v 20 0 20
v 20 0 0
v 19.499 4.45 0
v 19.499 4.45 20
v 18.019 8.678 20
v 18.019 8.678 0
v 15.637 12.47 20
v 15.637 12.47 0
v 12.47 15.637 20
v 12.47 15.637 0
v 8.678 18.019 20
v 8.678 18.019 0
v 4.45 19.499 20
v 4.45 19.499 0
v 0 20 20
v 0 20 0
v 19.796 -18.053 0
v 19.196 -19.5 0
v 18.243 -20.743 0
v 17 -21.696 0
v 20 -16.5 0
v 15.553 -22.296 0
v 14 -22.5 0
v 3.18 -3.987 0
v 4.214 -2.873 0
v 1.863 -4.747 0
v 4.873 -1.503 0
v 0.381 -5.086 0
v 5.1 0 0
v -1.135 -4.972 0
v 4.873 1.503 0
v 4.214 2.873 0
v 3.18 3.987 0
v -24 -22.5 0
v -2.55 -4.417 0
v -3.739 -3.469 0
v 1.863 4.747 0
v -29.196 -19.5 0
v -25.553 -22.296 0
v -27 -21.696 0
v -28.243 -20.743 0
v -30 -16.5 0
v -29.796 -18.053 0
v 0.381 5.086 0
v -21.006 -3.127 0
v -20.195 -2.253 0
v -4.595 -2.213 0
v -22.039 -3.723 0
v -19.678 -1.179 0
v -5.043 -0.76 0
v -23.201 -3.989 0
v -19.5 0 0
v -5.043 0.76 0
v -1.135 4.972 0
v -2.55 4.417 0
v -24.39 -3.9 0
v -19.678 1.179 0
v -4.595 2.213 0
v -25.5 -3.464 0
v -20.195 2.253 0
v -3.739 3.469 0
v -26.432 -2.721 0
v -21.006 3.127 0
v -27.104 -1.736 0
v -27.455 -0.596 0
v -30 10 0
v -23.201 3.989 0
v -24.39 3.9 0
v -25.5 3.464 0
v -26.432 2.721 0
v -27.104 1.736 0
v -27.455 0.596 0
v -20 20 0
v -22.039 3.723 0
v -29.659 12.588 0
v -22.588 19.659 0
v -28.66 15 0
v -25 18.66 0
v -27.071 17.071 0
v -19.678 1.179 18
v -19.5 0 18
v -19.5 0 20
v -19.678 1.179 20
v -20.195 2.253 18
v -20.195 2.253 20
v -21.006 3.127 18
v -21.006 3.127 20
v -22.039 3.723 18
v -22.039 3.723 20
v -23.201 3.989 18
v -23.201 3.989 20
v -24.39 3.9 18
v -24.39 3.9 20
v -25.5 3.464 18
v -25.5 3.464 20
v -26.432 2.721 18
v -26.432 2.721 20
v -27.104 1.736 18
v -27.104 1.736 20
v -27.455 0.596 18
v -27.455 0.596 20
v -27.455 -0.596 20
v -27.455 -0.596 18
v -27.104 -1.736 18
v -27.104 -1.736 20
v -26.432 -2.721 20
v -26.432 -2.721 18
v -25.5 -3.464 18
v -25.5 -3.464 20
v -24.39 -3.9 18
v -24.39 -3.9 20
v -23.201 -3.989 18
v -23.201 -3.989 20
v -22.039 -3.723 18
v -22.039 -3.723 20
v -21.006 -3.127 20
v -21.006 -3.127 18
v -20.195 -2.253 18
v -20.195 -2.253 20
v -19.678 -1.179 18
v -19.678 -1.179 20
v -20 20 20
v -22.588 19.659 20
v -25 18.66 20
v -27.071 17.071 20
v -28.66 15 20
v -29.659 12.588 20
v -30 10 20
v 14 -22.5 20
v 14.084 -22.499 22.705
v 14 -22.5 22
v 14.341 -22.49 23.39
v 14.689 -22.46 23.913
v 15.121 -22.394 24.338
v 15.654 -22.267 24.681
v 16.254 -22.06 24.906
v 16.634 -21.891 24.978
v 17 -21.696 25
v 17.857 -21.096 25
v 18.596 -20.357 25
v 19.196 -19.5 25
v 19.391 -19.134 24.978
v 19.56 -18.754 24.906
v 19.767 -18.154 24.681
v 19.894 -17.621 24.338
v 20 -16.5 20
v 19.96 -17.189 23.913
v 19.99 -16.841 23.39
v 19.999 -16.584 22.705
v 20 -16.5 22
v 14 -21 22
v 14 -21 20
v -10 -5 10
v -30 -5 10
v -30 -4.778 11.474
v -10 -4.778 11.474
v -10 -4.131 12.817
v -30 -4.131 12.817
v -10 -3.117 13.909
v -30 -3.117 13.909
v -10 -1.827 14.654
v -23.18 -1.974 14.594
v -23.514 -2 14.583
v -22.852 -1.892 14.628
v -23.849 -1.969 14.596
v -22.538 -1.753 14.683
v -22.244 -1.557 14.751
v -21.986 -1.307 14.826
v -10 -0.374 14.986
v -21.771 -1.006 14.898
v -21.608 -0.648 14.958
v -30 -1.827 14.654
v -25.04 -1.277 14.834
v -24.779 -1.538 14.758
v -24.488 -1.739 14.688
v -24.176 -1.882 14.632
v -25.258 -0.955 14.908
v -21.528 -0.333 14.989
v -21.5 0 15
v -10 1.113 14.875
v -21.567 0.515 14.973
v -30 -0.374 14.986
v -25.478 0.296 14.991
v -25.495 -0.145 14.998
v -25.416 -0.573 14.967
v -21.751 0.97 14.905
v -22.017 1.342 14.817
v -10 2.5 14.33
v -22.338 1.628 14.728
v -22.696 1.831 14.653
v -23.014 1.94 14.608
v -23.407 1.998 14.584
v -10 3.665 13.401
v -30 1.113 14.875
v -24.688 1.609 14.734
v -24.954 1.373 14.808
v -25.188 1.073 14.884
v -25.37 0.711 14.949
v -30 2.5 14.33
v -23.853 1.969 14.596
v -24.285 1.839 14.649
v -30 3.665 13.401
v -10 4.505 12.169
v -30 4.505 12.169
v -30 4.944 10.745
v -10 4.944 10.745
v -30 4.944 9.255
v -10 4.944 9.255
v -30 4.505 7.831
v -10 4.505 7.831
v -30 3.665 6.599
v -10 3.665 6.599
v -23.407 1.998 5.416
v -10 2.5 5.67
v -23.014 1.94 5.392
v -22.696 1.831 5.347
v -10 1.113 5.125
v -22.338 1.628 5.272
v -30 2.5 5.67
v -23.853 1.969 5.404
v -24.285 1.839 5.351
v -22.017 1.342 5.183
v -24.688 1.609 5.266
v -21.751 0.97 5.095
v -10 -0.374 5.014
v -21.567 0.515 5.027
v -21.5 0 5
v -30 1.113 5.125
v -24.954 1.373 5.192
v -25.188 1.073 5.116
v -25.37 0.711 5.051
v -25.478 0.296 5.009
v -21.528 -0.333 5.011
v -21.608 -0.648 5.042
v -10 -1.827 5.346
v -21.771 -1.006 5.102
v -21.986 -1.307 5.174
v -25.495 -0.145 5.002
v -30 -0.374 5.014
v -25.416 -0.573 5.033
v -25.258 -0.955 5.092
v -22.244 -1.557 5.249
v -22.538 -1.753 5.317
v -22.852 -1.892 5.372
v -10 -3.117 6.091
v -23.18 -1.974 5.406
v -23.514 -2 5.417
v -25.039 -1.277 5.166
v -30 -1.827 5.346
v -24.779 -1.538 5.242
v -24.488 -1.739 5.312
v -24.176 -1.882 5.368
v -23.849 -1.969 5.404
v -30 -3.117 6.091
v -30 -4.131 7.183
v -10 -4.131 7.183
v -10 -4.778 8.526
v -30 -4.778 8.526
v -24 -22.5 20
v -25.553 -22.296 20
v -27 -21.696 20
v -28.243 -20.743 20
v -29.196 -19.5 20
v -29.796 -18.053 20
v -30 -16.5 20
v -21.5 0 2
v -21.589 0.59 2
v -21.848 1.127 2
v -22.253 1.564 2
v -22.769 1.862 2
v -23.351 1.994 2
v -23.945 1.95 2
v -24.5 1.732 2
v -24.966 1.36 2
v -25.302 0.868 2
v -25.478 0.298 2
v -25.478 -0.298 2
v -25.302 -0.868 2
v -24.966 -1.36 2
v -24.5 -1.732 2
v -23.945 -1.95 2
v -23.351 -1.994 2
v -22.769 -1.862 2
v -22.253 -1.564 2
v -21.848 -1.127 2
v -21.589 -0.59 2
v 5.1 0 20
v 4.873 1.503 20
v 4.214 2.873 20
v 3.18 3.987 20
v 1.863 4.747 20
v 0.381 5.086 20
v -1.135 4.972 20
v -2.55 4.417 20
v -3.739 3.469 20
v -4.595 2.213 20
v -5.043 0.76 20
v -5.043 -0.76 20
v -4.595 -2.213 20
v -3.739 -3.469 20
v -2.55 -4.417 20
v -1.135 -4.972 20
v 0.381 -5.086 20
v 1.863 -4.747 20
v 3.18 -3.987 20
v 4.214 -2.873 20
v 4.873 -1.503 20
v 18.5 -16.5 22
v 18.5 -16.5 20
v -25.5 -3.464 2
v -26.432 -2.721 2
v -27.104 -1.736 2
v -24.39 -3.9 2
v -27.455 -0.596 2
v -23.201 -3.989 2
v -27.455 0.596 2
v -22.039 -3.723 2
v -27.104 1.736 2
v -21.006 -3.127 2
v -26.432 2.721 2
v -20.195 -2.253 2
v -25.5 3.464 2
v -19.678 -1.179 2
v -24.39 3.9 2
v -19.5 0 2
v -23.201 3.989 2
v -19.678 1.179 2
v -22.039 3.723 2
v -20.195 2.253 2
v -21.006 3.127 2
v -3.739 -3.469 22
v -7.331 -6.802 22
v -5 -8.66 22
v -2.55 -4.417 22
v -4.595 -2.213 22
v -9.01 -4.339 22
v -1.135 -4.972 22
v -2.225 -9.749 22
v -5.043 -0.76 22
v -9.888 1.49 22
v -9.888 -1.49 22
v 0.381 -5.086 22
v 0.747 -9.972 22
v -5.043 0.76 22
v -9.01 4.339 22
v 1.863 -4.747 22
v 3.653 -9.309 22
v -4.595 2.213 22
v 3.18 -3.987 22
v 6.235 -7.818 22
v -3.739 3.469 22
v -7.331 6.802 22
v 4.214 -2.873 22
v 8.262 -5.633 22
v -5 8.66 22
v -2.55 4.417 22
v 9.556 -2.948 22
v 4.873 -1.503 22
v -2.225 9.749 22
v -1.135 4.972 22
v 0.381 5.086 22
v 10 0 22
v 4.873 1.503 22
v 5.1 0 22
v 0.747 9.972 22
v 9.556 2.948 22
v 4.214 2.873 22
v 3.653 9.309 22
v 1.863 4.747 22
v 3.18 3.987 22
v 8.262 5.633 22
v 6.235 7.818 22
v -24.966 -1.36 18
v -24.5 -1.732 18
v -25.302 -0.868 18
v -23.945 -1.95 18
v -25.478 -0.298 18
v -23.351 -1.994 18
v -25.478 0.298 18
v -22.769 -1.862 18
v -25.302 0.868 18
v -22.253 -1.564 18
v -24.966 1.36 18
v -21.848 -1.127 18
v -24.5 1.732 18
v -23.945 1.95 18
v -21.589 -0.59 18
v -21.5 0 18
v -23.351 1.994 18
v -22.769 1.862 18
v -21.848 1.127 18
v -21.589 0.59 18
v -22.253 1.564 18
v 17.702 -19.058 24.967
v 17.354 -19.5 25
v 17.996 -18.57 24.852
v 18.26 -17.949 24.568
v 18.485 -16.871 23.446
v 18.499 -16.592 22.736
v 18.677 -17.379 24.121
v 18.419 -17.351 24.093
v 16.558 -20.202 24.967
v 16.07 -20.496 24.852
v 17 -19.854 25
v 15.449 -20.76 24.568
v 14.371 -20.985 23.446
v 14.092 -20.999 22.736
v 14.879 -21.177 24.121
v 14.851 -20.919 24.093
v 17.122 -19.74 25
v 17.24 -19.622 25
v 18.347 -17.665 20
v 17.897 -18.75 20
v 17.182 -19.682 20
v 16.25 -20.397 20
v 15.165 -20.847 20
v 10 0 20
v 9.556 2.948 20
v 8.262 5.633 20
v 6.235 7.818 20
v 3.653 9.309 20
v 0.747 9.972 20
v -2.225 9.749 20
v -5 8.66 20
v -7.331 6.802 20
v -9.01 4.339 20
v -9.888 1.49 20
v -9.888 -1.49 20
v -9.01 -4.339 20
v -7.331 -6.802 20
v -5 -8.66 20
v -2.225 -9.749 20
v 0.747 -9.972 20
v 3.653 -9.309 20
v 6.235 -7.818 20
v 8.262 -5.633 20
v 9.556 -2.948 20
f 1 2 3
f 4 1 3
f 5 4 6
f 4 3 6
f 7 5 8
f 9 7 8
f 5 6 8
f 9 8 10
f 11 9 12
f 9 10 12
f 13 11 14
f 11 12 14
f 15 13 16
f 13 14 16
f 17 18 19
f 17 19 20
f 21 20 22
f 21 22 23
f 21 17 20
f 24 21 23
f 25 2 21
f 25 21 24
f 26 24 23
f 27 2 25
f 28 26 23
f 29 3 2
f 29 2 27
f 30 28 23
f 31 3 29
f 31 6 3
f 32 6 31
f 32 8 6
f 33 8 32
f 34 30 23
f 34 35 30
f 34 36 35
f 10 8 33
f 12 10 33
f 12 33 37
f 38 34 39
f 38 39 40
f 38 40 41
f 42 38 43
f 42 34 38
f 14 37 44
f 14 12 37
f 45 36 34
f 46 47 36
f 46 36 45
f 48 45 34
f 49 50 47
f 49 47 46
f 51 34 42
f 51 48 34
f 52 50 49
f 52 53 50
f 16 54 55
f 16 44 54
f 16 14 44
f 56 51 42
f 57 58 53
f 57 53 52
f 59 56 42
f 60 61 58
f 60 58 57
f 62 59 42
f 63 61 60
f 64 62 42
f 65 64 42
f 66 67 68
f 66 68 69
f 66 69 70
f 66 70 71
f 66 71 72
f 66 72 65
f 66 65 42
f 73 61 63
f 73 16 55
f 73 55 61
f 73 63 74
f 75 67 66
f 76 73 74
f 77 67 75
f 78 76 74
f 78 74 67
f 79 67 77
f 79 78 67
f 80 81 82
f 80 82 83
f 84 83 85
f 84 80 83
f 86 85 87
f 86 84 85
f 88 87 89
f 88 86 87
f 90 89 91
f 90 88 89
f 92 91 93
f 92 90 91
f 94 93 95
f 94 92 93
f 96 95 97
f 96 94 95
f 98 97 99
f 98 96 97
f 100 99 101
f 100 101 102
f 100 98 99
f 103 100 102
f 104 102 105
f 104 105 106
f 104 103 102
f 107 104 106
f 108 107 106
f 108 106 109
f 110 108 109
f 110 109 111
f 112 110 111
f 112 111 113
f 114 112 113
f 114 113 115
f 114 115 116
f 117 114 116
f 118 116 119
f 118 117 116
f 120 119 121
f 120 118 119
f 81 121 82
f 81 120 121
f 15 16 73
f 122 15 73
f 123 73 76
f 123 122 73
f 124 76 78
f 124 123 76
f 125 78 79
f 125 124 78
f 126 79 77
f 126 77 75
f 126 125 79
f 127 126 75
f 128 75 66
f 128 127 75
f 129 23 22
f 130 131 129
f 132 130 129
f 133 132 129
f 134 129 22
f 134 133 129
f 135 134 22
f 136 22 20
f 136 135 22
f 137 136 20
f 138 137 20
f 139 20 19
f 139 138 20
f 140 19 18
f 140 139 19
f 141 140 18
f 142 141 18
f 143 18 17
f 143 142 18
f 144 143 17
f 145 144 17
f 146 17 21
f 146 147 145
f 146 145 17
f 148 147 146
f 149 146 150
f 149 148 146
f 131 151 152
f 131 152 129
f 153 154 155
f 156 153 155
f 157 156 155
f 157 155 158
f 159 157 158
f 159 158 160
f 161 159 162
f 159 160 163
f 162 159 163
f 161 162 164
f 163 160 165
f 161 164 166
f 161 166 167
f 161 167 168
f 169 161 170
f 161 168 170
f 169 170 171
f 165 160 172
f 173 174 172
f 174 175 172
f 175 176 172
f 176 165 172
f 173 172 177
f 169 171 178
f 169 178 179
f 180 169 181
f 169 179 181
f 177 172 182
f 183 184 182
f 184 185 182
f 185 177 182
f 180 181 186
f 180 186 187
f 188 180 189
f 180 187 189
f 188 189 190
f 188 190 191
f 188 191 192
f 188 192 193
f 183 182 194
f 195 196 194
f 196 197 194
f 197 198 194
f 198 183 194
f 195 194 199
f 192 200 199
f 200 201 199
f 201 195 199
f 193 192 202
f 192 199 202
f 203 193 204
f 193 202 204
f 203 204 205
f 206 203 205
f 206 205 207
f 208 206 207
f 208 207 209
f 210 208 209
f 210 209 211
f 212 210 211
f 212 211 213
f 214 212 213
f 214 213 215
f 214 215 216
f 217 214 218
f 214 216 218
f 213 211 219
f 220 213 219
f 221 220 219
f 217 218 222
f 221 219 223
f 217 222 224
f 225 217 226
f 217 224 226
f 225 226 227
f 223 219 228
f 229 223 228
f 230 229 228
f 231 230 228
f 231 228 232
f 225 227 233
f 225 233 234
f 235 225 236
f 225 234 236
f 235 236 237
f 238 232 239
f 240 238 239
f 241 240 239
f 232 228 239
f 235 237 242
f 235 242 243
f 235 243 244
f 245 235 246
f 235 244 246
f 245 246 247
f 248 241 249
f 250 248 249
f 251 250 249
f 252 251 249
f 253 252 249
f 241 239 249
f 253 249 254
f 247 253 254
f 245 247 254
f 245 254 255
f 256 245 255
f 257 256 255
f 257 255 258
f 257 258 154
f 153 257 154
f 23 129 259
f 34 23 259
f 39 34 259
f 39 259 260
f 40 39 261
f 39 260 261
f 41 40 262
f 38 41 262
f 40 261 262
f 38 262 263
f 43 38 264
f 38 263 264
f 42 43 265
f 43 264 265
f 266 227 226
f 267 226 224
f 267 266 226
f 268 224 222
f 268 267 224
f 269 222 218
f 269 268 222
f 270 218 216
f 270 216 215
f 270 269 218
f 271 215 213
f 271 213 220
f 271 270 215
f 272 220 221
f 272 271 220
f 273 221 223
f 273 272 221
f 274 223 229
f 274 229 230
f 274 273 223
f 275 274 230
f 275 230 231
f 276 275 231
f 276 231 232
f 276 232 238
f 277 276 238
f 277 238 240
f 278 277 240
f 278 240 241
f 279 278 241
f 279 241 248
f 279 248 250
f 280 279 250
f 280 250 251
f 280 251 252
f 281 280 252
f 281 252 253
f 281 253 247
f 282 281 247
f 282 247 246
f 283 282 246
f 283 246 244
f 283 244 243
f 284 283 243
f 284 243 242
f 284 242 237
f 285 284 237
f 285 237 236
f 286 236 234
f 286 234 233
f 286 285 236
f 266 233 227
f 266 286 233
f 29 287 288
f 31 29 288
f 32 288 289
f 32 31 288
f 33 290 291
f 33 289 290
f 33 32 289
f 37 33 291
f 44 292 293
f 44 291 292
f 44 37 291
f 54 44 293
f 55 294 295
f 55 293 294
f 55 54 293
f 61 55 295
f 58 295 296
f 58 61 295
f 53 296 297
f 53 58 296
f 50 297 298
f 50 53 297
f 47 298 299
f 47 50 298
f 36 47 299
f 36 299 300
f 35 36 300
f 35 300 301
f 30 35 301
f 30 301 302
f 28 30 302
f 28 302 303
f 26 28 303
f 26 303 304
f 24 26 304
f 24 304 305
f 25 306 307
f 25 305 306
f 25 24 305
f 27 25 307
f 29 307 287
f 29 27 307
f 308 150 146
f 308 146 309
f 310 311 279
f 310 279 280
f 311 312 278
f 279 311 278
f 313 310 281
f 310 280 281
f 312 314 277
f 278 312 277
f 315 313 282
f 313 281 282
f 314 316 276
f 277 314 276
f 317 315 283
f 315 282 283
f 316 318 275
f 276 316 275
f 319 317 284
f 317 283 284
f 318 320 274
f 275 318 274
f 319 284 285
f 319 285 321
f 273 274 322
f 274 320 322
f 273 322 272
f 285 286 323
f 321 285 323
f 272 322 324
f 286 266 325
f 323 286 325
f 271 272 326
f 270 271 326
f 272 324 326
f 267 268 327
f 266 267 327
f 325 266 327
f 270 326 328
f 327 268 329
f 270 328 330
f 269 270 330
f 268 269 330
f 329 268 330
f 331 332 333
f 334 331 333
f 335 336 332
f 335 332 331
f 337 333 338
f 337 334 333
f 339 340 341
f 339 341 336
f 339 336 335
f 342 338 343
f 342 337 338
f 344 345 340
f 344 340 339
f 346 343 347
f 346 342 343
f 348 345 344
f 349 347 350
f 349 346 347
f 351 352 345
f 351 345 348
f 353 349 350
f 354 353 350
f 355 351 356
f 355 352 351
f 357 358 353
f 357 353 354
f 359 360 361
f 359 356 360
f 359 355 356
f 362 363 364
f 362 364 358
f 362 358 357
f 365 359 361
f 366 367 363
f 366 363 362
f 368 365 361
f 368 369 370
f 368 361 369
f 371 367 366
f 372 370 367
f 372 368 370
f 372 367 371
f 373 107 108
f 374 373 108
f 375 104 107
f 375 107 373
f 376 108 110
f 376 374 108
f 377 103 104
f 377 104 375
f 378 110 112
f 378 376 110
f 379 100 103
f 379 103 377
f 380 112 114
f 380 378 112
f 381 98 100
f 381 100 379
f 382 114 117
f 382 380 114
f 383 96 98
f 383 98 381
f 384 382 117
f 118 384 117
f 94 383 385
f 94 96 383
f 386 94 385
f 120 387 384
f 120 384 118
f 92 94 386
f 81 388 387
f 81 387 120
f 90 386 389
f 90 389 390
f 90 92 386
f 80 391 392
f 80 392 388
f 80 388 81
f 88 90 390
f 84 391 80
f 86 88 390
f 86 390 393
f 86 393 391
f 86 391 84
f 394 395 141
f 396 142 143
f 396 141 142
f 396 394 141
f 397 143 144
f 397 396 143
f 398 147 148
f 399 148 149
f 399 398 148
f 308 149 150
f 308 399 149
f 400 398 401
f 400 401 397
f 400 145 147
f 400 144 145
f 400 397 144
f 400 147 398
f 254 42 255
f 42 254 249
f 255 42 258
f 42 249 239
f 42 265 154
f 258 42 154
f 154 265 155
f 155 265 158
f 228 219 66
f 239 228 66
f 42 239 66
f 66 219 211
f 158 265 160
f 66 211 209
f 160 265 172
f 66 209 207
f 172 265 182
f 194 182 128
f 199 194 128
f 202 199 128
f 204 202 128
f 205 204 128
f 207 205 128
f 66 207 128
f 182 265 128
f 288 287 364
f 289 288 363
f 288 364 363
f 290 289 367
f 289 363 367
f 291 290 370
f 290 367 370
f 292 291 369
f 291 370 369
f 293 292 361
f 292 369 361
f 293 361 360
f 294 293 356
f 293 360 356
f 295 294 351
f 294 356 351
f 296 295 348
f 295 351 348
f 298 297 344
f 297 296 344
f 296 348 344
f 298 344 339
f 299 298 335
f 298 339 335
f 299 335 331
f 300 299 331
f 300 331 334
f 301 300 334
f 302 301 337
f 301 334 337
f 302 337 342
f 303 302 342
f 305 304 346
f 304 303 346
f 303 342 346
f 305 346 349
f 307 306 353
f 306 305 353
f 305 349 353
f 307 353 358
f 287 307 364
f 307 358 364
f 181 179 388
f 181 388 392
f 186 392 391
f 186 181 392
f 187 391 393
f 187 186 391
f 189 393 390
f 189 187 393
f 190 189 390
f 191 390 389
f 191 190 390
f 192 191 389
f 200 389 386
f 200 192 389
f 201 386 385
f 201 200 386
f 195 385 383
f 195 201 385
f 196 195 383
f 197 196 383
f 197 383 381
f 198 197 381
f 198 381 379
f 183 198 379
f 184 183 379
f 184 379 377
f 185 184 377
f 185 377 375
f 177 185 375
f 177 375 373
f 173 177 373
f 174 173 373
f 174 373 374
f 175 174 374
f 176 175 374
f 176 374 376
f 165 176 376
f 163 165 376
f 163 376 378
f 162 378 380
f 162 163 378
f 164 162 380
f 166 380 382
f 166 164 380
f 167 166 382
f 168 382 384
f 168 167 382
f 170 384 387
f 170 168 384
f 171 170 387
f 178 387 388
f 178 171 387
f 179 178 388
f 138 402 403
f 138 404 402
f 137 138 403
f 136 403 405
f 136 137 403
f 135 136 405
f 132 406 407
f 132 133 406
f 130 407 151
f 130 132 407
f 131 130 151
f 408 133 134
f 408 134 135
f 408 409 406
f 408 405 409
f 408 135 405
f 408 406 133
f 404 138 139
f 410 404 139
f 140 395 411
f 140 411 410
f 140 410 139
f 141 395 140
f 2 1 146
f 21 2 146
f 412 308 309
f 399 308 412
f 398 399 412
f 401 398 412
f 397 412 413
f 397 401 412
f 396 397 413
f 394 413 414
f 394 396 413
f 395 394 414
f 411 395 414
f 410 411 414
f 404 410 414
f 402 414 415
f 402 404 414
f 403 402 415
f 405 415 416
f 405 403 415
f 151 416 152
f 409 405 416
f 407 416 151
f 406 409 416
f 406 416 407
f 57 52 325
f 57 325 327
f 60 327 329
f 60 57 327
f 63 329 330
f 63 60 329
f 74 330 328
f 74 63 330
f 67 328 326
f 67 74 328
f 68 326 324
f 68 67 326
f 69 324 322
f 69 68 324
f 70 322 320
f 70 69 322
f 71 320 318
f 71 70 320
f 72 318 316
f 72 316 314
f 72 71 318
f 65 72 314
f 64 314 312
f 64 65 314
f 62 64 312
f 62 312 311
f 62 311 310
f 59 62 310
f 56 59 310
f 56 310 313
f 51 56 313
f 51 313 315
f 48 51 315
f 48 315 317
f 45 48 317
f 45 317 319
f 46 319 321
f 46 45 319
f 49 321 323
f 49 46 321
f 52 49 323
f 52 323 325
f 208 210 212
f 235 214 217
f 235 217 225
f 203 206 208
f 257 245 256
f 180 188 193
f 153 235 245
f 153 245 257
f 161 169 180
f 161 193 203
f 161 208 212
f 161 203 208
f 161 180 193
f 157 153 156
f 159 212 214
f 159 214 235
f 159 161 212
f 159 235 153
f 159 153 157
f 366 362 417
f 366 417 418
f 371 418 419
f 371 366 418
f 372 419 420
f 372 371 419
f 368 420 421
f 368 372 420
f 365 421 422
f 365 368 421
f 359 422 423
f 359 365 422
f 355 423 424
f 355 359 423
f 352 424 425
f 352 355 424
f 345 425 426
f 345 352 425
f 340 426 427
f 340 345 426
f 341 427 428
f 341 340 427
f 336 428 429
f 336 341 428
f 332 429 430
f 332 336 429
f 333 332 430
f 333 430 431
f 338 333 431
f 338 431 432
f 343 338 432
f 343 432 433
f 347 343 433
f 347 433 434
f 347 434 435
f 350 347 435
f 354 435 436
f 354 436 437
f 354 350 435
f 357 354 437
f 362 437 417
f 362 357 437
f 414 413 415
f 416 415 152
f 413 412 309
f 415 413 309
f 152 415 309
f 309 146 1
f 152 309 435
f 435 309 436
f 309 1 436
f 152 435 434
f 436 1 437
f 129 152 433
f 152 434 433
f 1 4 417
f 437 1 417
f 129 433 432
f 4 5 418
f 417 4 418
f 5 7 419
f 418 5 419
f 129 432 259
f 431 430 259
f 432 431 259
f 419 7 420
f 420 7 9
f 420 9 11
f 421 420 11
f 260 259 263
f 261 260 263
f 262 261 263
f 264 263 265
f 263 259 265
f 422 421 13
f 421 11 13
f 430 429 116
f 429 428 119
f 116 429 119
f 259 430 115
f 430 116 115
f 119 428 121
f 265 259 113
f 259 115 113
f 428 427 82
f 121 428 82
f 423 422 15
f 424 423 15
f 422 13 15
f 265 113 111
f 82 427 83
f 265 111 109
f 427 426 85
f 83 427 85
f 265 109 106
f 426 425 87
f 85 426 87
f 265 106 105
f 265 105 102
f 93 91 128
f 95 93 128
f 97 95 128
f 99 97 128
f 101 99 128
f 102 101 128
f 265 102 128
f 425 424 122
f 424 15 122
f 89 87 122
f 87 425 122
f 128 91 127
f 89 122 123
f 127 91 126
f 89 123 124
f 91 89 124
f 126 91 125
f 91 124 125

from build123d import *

# Parameters (mm, degrees)
BOSS_EXTRU_1_DEPTH           = 20
ESQUISSE3_R                  = 5
ENL_V_MAT_EXTRU_1_DEPTH      = 20
CONG_1_R                     = 10
ENL_V_MAT_EXTRU_3_DEPTH      = 42.231056256
ENL_V_MAT_EXTRU_3_DEPTH_BACK = 42.231056256
ESQUISSE1_4_R                = 2
ESQUISSE1_5_R                = 4
ENL_V_MAT_EXTRU_4_DEPTH      = 2
ENL_V_START                  = 18
ESQUISSE1_6_R                = 4
ENL_V_MAT_EXTRU_5_DEPTH      = 2
BOSS_EXTRU_4_DEPTH           = 20
BOSS_EXTRU_5_START           = 5
BOSS_EXTRU_5_DEPTH           = 5
CONG_3_START                 = -24
CONG_3_DEPTH                 = 7.5
CONG_4_START                 = 16.9999999
CONG_4_DEPTH                 = 4.0000001
ENL_V_MAT_EXTRU_6_DEPTH      = 2
ENL_V_MAT_EXTRU_6_DEPTH_BACK = 43.500000171
ESQUISSE7_R                  = 5.1
BOSS_EXTRU_7_START           = 2
ESQUISSE9_R                  = 10
ESQUISSE9_R_2                = 5.1
BOSS_EXTRU_7_DEPTH           = 2


with BuildPart() as part:
    # Esquisse1 → Boss.-Extru.1 (new body)
    with BuildSketch(Plane.XY):
        with BuildLine():
            Line((0, 20), (-30, 20))
            Line((-30, 20), (-30, -20))
            Line((-30, -20), (0, -20))
            ThreePointArc((0, -20), (20, 0), (0, 20))
        make_face()
    extrude(amount=BOSS_EXTRU_1_DEPTH)

    # Esquisse3 → Enlèv. mat.-Extru.1 (cut)
    with BuildSketch(Plane.ZY.offset(30)):
        with Locations(Location((10, 0, 0), (0, 0, 270))):
            Circle(ESQUISSE3_R)
    extrude(amount=-ENL_V_MAT_EXTRU_1_DEPTH, mode=Mode.SUBTRACT)

    # Congé1
    cong_1_edges = [part.edges().sort_by_distance(p)[0] for p in [
        (-30, 20, 10),
        (-30, -20, 10),
    ]]
    fillet(cong_1_edges, radius=CONG_1_R)

    # Esquisse1<4> → Enlèv. mat.-Extru.3 (cut, two sides: drawn at the far end of the back side and taken through both)
    with BuildSketch(Plane.XY.offset(-ENL_V_MAT_EXTRU_3_DEPTH_BACK)):
        with Locations((-23.5, 0)):
            Circle(ESQUISSE1_4_R)
    extrude(amount=ENL_V_MAT_EXTRU_3_DEPTH + ENL_V_MAT_EXTRU_3_DEPTH_BACK, mode=Mode.SUBTRACT)

    # Esquisse1<5> → Enlèv. mat.-Extru.4 (cut)
    with BuildSketch(Plane.XY):
        with Locations((-23.5, 0)):
            Circle(ESQUISSE1_5_R)
    extrude(amount=ENL_V_MAT_EXTRU_4_DEPTH, mode=Mode.SUBTRACT)

    # Esquisse1<6> → Enlèv. mat.-Extru.5 (cut)
    with BuildSketch(Plane.XY.offset(ENL_V_START)):
        with Locations((-23.5, 0)):
            Circle(ESQUISSE1_6_R)
    extrude(amount=ENL_V_MAT_EXTRU_5_DEPTH, mode=Mode.SUBTRACT)

    # Esquisse5 → Boss.-Extru.4 (add)
    with BuildSketch(Plane.XY.offset(20)):
        with BuildLine():
            Line((20, 0), (20, -16.5))
            ThreePointArc((20, -16.5), (18.242640687, -20.742640687), (14, -22.5))
            Line((14, -22.5), (-24, -22.5))
            ThreePointArc((-24, -22.5), (-28.242640687, -20.742640687), (-30, -16.5))
            Line((-30, -16.5), (-30, -10))
            ThreePointArc((-30, -10), (-27.071067812, -17.071067812), (-20, -20))
            Line((-20, -20), (0, -20))
            ThreePointArc((0, -20), (14.142135624, -14.142135624), (20, 0))
        make_face()
    extrude(amount=-BOSS_EXTRU_4_DEPTH)

    # Esquisse6 → Boss.-Extru.5 (add)
    with BuildSketch(Plane.XY.offset(20).offset(BOSS_EXTRU_5_START)):
        with BuildLine():
            Line((20, -16.5), (18.5, -16.5))
            ThreePointArc((18.5, -16.5), (17.181980515, -19.681980515), (14, -21))
            Line((14, -21), (14, -22.5))
            ThreePointArc((14, -22.5), (18.242640687, -20.742640687), (20, -16.5))
        make_face()
    extrude(amount=-BOSS_EXTRU_5_DEPTH)

    # Congé3: read off the stored shape, not the designer's step
    # Congé3 outline → Congé3 (cut)
    with BuildSketch(Plane(origin=(0, 0, 0), x_dir=(1, 0, 0), z_dir=(0, 1, 0)).offset(CONG_3_START)):
        with BuildLine():
            Line((14, -25), (17, -25))
            add(Edge.make_bspline(
                [(17, -25), (14, -25), (14, -22)],
                knots=[0, 0, 0, 1, 1, 1], degree=2, weights=[1, 0.707106781, 1]))
            Line((14, -22), (14, -25))
        make_face()
    extrude(amount=CONG_3_DEPTH, mode=Mode.SUBTRACT)

    # Congé4: read off the stored shape, not the designer's step
    # Congé4 outline → Congé4 (cut)
    with BuildSketch(Plane.YZ.offset(CONG_4_START)):
        with BuildLine():
            Line((-16.5, 25), (-19.5, 25))
            add(Edge.make_bspline(
                [(-19.5, 25), (-16.5, 25), (-16.5, 22)],
                knots=[0, 0, 0, 1, 1, 1], degree=2, weights=[1, 0.707106781, 1]))
            Line((-16.5, 22), (-16.5, 25))
        make_face()
    extrude(amount=CONG_4_DEPTH, mode=Mode.SUBTRACT)

    # Esquisse7 → Enlèv. mat.-Extru.6 (cut, two sides: drawn at the far end of the back side and taken through both)
    with BuildSketch(Plane.XY.offset(20).offset(-ENL_V_MAT_EXTRU_6_DEPTH_BACK)):
        Circle(ESQUISSE7_R)
    extrude(amount=ENL_V_MAT_EXTRU_6_DEPTH + ENL_V_MAT_EXTRU_6_DEPTH_BACK, mode=Mode.SUBTRACT)

    # Esquisse9 → Boss.-Extru.7 (add)
    with BuildSketch(Plane.XY.offset(20).offset(BOSS_EXTRU_7_START)):
        Circle(ESQUISSE9_R)
        Circle(ESQUISSE9_R_2, mode=Mode.SUBTRACT)
    extrude(amount=-BOSS_EXTRU_7_DEPTH)


solid = part.part
